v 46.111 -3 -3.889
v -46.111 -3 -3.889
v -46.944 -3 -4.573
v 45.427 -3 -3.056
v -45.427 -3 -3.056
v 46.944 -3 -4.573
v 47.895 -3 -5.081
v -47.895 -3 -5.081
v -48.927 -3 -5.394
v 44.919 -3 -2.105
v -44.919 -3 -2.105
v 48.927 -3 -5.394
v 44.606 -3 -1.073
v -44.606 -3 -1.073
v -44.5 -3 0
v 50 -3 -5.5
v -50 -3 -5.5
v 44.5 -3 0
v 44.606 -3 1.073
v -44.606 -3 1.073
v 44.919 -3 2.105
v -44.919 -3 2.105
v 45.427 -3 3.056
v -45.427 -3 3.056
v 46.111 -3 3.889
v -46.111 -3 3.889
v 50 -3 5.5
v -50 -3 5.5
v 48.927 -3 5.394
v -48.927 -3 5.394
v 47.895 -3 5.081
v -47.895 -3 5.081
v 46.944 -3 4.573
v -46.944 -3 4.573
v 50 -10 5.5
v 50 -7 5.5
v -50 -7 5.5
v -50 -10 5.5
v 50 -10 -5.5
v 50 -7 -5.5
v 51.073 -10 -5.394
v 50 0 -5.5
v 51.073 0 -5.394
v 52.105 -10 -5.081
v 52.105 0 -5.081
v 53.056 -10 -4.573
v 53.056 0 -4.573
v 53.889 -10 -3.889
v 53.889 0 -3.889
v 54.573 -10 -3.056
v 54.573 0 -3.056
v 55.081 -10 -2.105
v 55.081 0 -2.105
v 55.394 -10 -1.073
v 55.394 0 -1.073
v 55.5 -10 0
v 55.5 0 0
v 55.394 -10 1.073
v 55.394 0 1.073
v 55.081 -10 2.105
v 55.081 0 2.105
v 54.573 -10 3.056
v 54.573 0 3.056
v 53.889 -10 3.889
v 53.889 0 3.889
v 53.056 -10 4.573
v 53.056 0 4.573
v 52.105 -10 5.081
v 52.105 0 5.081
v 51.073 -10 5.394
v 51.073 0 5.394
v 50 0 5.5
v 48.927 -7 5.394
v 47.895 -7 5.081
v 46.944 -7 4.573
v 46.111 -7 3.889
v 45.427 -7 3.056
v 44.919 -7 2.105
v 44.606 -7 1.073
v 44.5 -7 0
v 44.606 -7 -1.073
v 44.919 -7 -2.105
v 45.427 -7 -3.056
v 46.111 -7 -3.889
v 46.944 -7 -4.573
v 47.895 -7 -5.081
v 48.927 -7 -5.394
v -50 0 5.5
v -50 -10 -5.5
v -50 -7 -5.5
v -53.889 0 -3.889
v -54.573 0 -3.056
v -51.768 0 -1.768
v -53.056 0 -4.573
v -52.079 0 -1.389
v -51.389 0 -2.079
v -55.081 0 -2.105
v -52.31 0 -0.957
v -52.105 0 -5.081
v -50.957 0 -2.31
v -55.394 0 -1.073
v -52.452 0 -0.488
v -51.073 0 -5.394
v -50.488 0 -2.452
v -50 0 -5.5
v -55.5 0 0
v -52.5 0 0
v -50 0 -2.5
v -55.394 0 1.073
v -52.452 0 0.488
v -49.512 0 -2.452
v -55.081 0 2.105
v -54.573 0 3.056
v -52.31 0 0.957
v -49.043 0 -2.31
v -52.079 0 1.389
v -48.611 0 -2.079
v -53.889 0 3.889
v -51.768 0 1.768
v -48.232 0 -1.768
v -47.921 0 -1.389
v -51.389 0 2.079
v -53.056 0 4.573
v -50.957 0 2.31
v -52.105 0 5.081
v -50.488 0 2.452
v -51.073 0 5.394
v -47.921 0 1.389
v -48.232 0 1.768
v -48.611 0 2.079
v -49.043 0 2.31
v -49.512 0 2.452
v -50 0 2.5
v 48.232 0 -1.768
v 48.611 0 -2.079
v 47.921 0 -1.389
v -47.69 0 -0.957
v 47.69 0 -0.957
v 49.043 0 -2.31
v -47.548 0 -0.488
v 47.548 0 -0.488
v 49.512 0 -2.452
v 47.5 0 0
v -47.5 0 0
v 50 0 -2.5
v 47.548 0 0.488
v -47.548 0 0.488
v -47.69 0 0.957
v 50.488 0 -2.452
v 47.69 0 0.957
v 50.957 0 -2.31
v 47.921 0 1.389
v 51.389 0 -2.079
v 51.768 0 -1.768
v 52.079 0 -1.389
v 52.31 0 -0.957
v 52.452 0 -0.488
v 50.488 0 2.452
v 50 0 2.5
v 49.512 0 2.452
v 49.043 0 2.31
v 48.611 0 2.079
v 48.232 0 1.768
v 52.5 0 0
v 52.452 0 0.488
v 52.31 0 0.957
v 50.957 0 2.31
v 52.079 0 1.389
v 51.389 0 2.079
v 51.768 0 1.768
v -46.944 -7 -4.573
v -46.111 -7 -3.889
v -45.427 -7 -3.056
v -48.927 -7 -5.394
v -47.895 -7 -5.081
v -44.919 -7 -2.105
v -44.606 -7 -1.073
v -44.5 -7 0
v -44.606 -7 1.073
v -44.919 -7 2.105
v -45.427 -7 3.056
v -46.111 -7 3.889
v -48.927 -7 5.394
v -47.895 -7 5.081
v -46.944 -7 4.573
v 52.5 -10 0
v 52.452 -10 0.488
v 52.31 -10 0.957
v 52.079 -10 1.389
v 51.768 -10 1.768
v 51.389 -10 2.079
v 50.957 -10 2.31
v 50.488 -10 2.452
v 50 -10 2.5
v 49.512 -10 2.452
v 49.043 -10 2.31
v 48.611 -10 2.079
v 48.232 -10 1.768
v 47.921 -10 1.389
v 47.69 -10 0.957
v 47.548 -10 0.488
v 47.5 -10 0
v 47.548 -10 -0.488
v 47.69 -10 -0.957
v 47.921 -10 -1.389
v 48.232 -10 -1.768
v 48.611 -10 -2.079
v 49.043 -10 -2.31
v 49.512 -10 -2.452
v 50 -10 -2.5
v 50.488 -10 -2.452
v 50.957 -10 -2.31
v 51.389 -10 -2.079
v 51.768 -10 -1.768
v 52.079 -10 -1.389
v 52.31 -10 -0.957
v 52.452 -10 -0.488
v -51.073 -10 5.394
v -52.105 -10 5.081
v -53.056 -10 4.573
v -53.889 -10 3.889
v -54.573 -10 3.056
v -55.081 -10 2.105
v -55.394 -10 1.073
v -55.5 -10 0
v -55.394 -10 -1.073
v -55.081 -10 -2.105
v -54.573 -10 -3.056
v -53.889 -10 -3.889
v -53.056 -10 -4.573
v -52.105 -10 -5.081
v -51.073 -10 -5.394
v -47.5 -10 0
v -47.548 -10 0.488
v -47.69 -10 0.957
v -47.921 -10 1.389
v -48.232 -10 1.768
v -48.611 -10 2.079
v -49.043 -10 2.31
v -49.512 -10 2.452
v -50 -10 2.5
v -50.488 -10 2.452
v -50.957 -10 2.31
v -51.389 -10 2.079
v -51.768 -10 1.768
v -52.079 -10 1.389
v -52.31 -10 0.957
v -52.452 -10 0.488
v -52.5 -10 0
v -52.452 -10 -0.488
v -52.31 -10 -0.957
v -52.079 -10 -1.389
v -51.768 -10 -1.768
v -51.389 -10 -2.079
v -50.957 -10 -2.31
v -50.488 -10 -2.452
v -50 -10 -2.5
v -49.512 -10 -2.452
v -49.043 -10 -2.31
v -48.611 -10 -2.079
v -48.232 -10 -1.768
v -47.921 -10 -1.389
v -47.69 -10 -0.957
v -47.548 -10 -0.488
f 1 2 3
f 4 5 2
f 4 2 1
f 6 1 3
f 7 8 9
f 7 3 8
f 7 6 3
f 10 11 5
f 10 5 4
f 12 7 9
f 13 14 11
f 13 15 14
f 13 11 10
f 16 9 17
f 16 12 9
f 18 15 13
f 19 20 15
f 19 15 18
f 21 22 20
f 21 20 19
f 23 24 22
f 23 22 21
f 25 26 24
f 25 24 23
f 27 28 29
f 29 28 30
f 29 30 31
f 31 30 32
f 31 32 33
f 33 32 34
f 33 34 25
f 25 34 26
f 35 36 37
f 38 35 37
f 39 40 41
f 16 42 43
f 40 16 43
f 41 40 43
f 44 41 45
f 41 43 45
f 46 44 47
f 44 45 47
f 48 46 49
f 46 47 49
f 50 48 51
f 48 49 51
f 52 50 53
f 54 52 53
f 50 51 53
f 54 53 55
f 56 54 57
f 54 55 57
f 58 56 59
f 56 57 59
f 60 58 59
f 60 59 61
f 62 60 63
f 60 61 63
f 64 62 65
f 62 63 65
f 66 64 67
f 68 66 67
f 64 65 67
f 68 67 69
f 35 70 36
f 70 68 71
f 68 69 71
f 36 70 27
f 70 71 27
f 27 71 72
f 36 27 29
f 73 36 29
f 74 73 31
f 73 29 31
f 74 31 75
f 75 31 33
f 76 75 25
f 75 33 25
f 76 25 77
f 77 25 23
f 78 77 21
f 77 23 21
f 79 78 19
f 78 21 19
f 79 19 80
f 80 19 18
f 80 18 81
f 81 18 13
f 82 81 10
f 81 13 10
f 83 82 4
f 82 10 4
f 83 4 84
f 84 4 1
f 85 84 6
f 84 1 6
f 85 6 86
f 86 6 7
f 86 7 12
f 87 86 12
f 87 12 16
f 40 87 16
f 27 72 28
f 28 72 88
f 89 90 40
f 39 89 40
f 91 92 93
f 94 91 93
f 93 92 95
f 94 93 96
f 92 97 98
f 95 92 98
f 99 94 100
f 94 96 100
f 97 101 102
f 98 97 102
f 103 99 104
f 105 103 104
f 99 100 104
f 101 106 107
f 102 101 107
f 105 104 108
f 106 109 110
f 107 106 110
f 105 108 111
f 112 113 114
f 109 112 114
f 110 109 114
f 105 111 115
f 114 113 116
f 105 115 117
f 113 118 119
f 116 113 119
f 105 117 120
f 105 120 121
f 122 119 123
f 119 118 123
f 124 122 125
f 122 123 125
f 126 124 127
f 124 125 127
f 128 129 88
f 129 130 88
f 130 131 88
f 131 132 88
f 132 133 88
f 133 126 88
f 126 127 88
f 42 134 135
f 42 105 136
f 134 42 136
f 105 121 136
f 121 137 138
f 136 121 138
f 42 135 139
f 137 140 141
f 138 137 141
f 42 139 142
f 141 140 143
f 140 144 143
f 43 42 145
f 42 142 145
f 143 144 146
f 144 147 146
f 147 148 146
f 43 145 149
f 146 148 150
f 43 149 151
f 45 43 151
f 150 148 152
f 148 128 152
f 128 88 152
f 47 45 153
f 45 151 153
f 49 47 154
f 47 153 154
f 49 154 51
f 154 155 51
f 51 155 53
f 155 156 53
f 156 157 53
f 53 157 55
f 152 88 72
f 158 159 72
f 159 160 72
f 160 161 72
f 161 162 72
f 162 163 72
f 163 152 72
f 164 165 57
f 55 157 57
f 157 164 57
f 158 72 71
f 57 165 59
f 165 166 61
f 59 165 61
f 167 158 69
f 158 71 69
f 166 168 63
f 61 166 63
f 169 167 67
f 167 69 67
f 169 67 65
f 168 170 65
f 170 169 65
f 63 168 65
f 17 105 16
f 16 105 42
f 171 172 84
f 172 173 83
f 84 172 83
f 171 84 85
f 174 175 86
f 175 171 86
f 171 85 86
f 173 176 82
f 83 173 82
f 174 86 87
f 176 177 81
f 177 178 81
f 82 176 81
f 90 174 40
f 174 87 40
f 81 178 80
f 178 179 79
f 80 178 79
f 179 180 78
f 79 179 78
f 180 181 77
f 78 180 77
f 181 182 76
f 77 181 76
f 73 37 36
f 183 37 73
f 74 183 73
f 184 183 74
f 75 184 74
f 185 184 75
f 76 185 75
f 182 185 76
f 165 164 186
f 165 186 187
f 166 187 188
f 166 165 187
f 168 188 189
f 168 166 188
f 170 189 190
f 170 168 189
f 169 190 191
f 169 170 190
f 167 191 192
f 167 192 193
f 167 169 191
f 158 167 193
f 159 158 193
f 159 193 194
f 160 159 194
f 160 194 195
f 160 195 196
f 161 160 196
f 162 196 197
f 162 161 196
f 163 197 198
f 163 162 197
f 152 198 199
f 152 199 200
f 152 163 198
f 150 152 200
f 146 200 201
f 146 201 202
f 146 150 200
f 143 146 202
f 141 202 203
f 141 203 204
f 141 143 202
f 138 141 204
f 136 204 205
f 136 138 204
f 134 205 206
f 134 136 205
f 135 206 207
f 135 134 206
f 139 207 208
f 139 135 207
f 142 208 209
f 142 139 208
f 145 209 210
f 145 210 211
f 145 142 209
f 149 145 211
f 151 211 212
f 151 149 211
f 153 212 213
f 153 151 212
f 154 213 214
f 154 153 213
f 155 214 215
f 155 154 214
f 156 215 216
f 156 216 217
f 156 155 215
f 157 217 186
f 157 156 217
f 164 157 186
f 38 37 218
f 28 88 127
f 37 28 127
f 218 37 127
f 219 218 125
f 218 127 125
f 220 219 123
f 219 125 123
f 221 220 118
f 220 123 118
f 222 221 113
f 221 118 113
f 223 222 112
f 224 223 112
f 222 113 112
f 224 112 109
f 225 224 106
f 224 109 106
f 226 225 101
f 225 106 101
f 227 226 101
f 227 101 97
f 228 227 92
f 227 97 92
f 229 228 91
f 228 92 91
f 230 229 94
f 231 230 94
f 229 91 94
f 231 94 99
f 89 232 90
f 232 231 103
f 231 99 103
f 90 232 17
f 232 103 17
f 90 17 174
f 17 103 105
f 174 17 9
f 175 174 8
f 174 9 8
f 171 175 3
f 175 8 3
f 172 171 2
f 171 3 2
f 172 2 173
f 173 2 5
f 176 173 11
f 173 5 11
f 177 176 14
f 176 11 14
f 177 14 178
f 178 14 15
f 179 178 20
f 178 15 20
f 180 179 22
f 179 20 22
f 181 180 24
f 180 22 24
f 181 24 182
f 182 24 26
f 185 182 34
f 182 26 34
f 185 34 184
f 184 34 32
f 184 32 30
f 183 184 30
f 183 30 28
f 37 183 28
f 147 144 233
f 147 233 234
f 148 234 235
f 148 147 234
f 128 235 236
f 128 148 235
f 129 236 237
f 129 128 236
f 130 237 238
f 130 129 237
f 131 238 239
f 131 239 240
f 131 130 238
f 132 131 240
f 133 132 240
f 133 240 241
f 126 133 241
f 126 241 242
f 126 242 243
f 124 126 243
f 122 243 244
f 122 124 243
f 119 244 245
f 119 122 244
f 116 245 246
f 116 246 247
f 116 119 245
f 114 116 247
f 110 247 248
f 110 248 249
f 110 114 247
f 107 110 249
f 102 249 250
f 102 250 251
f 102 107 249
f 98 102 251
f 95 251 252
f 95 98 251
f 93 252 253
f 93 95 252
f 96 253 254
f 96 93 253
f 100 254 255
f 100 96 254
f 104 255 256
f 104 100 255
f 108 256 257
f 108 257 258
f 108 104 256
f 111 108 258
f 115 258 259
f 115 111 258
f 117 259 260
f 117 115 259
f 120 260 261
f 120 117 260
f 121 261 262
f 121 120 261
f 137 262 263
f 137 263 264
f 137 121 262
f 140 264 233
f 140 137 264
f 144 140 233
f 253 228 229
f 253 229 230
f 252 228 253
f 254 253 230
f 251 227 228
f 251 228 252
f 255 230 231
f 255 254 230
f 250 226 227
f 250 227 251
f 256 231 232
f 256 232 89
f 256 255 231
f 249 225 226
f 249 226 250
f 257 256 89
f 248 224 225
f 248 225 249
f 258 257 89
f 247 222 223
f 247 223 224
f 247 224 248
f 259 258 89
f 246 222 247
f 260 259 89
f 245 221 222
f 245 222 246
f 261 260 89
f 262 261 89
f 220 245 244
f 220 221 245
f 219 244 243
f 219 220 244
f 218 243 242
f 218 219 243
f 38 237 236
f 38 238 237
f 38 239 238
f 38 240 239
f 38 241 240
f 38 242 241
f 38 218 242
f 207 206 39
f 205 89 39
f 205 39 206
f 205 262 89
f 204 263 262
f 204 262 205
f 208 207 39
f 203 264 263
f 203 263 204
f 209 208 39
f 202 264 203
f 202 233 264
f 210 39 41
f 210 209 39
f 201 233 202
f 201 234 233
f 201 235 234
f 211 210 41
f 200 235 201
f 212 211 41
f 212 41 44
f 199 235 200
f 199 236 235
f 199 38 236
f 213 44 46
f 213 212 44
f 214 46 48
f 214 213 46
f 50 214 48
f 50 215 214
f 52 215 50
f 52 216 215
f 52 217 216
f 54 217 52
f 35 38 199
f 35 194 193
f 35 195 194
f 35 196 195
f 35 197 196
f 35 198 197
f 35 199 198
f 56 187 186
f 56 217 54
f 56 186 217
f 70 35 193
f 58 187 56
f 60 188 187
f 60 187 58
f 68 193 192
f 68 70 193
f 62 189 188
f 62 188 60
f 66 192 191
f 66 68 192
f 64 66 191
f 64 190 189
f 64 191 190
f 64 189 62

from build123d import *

# Parameters (mm, degrees)
F0_R     = 2.5
F1_DEPTH = 10
F2_T     = 3


# Not quite as in the source:
# - a shell that OpenCascade refuses in one call is made with other operations: the cavity is built on its own and cut out


with BuildPart() as f1:
    # F0 (on Front) → F1 (new body)
    with BuildSketch(Plane.XZ):
        with BuildLine():
            Line((0, 5.5), (-50, 5.5))
            ThreePointArc((-50, 5.5), (-55.5, 0), (-50, -5.5))
            Line((-50, -5.5), (0, -5.5))
            Line((0, -5.5), (50, -5.5))
            ThreePointArc((50, -5.5), (55.5, 0), (50, 5.5))
            Line((50, 5.5), (0, 5.5))
        make_face()
        with Locations((-50, 0)):
            Circle(F0_R, mode=Mode.SUBTRACT)
        with Locations((50, 0)):
            Circle(F0_R, mode=Mode.SUBTRACT)
    extrude(amount=F1_DEPTH)

    # F2: shell of thickness 3, made by hand


with BuildPart() as f2_core1:
    # F2_t2: copy of F1
    add(f1.part)

    # the walls: a layer under each face that stays
    f2_faces = [f2_core1.faces().sort_by_distance(p)[0] for p in [
        (0, -10, 0),
        (47.5, -5, 0),
        (-52.5, -5, 0),
        (55.5, -5, 0),
        (0, 0, 0),
        (-55.5, -5, 0),
    ]]
    thicken(f2_faces, amount=-F2_T, mode=Mode.SUBTRACT)


with BuildPart() as f1_1:
    add(f1.part)

    # what is left inside the walls is the cavity
    f2_cavity = [f2_core1.part.solids().sort_by_distance(p)[0] for p in [
        (0, -3.03, -1.833333),
    ]]
    add(f2_cavity, mode=Mode.SUBTRACT)


solid = f1_1.part
